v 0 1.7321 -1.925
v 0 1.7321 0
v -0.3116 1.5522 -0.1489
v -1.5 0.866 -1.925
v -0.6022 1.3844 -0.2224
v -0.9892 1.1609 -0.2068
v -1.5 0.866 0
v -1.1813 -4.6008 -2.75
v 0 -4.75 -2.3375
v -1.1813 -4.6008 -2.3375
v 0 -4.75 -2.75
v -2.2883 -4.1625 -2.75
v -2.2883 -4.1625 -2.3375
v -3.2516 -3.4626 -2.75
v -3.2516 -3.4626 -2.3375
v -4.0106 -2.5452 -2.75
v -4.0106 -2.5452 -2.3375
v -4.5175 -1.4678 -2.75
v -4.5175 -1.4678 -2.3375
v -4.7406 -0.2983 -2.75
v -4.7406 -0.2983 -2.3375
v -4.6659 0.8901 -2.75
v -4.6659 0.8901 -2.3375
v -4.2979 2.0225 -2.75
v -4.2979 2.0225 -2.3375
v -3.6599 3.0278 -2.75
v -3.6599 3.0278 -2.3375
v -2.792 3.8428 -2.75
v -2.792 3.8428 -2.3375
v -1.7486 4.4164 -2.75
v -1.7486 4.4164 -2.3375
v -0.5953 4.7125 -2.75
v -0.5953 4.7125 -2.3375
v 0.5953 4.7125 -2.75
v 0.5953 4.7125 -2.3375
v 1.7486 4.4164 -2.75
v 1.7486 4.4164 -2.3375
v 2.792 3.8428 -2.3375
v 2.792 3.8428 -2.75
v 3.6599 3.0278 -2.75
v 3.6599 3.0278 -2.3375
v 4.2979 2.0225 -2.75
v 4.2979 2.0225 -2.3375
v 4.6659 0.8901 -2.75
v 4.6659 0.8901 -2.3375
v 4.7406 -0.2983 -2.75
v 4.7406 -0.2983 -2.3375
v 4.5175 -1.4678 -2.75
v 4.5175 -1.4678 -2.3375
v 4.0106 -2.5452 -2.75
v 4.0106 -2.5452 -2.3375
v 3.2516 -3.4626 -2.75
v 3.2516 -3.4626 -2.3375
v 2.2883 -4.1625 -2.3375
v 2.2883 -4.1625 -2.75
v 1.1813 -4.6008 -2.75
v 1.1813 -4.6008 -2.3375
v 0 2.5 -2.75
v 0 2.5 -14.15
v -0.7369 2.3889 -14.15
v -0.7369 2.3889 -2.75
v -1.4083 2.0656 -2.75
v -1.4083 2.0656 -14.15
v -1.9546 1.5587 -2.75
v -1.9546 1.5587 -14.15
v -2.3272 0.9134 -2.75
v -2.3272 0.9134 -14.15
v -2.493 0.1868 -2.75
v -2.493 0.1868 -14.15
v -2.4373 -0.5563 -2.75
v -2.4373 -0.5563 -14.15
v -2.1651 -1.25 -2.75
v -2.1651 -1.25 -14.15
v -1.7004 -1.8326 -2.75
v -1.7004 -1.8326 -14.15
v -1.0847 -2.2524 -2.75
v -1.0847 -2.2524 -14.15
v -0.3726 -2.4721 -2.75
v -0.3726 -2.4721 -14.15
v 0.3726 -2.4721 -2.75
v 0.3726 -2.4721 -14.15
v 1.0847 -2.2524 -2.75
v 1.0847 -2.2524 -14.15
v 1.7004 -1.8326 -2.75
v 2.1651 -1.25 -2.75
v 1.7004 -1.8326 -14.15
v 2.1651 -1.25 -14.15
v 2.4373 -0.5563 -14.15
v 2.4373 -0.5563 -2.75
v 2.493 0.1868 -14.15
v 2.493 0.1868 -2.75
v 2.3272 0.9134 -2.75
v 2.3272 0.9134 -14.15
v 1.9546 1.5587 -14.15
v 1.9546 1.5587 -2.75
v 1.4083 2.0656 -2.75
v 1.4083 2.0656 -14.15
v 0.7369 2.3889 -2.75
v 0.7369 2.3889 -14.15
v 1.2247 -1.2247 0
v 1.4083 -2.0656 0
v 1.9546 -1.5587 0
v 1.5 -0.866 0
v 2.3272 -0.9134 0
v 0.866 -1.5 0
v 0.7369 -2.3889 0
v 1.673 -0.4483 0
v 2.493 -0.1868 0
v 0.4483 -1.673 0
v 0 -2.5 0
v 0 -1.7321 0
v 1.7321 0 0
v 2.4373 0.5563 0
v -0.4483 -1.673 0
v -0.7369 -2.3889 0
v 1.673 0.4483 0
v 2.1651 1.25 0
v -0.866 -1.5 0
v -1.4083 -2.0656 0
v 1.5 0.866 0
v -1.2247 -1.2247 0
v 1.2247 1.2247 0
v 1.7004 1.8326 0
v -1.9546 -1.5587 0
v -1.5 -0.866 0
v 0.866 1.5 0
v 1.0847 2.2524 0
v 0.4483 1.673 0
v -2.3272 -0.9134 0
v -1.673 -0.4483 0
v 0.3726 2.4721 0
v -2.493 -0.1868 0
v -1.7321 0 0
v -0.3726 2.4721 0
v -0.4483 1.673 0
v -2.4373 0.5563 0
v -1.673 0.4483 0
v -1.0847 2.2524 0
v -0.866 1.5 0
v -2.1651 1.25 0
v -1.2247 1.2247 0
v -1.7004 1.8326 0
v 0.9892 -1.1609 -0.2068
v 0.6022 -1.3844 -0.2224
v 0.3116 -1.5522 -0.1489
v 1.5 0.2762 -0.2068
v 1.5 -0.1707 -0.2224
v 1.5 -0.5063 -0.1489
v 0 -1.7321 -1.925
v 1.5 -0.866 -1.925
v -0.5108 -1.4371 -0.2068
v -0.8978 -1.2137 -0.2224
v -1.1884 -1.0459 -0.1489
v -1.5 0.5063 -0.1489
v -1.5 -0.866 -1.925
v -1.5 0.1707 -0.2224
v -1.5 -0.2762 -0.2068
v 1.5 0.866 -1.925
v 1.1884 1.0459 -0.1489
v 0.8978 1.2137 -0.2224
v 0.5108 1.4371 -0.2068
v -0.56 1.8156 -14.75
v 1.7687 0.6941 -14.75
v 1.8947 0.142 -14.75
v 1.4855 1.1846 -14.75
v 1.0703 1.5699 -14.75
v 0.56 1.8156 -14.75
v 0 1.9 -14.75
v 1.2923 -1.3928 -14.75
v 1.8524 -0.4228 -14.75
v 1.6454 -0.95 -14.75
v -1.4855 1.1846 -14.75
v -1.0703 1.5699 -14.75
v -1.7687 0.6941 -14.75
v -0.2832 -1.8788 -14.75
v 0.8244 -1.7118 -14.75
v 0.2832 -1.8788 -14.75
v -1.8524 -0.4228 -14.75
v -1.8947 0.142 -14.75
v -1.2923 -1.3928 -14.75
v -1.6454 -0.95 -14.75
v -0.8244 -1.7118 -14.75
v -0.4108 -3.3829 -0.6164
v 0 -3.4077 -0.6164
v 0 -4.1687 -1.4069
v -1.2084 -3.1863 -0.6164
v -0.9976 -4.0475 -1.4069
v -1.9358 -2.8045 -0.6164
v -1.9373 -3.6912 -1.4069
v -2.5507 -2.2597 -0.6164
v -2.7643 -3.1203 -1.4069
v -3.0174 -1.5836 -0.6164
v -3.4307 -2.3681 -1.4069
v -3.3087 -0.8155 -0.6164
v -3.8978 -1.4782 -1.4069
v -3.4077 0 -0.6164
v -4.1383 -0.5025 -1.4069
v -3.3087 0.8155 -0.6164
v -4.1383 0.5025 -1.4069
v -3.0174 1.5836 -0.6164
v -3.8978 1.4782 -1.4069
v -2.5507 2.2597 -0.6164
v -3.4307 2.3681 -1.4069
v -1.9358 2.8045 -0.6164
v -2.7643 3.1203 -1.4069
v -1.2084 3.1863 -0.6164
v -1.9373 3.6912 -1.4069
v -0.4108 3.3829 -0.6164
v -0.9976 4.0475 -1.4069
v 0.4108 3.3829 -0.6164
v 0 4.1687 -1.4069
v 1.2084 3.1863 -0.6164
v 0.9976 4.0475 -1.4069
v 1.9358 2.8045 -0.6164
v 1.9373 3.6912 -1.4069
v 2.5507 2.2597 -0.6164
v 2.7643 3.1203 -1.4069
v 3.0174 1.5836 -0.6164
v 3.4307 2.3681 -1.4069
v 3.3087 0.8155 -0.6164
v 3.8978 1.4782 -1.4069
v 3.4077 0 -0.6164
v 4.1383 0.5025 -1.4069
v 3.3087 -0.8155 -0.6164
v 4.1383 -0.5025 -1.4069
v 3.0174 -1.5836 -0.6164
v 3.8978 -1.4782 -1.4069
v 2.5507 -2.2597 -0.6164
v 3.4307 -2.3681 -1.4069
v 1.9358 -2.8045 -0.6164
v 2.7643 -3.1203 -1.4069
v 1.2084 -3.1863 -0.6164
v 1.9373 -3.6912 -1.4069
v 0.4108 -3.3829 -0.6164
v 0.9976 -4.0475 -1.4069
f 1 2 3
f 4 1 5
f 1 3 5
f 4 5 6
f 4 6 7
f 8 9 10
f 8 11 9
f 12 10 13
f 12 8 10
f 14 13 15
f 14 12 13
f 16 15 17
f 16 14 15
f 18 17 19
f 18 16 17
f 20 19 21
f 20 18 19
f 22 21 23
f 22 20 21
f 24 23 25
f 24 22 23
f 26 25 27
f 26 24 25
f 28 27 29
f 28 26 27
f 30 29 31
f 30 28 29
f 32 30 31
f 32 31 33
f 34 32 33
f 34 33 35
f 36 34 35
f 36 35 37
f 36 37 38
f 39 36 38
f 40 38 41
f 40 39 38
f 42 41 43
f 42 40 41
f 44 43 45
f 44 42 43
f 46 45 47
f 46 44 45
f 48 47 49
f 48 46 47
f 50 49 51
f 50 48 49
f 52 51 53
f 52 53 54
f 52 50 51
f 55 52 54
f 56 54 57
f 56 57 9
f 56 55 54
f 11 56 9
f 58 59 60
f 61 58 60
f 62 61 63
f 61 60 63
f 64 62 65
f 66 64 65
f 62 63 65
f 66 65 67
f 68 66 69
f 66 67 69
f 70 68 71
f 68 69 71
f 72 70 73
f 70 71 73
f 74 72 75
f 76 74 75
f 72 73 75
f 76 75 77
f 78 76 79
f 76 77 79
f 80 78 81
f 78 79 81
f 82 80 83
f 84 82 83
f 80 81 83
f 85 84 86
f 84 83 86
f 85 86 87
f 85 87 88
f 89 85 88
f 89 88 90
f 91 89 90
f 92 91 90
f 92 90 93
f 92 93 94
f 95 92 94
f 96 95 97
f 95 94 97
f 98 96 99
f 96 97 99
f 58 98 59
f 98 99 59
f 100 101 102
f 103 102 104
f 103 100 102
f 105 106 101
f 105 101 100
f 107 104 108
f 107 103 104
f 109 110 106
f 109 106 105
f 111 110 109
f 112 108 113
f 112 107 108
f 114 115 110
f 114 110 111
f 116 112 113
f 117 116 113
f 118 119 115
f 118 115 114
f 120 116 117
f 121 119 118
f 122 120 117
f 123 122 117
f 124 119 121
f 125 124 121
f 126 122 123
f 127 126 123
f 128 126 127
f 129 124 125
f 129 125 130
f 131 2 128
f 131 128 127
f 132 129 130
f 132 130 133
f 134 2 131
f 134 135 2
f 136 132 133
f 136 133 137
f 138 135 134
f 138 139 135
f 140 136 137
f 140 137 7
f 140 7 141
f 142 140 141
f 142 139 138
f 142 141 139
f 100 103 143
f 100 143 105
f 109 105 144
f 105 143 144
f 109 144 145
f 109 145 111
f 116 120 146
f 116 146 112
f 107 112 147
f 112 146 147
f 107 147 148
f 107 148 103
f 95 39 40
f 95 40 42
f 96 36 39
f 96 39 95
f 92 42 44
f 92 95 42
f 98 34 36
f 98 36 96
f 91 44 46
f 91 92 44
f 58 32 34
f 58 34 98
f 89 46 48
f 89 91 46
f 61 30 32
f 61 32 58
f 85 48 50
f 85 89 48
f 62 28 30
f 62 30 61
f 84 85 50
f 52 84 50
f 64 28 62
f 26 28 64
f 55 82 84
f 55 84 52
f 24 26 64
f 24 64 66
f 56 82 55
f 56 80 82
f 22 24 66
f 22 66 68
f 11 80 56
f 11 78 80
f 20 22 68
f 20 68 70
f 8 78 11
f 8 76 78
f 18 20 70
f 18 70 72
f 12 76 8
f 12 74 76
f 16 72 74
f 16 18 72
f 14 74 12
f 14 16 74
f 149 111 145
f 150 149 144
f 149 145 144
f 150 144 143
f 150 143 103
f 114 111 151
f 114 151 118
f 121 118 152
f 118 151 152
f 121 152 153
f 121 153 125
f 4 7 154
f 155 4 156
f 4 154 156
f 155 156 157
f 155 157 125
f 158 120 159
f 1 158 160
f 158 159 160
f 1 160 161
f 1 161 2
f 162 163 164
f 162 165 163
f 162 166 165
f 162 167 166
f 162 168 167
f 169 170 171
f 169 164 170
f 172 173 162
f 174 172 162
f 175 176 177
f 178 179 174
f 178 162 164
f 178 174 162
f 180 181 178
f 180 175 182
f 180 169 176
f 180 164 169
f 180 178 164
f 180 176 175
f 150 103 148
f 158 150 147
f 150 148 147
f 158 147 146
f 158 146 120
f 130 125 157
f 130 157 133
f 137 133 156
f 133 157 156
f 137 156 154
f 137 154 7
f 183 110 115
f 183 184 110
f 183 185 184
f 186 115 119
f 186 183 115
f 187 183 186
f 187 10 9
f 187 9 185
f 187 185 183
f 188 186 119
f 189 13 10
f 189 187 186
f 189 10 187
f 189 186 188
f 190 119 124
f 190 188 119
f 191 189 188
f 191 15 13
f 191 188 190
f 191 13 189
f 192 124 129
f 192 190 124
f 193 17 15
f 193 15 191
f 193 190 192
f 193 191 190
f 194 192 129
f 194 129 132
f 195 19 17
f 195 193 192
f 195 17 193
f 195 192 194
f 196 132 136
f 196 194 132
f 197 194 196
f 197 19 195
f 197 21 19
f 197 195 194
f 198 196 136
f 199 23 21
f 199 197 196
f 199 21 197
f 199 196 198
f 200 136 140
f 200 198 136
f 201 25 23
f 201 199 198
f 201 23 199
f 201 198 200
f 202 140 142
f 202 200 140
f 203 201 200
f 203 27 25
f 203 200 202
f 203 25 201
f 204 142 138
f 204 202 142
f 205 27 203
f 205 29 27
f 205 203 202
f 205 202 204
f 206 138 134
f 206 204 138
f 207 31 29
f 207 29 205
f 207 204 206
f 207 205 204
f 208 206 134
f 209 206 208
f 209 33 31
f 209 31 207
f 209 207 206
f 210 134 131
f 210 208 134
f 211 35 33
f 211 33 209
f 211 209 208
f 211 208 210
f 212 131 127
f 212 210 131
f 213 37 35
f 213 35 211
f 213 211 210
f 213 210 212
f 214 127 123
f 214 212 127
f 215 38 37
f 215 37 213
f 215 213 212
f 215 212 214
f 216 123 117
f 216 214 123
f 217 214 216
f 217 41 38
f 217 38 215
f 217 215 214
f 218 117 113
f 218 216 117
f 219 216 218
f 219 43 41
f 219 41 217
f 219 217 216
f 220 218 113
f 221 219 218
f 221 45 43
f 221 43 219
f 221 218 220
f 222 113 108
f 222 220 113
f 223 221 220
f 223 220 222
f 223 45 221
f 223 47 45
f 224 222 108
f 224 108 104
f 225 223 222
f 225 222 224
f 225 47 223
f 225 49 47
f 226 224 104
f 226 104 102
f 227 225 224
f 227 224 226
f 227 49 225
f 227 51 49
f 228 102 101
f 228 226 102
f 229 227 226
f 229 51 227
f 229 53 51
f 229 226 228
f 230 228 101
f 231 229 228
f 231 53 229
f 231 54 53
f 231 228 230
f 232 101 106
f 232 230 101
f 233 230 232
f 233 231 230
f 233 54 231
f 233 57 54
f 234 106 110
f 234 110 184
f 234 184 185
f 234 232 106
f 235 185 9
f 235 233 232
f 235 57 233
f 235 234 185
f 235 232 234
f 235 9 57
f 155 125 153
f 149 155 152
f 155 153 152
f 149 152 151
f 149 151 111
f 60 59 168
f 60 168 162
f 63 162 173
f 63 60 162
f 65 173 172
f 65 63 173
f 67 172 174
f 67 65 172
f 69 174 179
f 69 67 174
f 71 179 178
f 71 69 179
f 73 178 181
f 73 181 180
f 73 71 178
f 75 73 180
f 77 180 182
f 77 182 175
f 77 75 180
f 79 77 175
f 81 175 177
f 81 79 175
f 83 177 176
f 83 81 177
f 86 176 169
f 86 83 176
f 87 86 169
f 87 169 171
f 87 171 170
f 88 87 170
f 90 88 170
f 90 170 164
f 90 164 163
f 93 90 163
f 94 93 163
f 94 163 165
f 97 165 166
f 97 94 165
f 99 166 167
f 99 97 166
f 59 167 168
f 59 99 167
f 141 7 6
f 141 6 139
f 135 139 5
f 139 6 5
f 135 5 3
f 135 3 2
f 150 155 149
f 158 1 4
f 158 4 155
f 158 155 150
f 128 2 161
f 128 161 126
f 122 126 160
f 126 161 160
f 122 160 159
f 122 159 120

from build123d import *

# Parameters (mm, degrees)
SKETCH1_W          = 12
SKETCH1_H          = 2.5
CHAMFER1_SIZE      = 0.6
CUT_EXTRUDE2_DEPTH = 1.925


with BuildPart() as part:
    # Sketch1 → Revolve1 (revolve)
    with BuildSketch(Plane(origin=(0, 0, 0), x_dir=(0, 0, -1), z_dir=(1, 0, 0))):
        with Locations((8.75, 1.25)):
            Rectangle(SKETCH1_W, SKETCH1_H)
    revolve(axis=Axis((0, 0, -14.75), (0, 0, 1)))

    # Chamfer1
    chamfer1_edges = [part.edges().sort_by_distance(p)[0] for p in [
        (0, -2.5, -14.75),
    ]]
    chamfer(chamfer1_edges, length=CHAMFER1_SIZE)

    # Sketch7 → Revolve2 (revolve)
    with BuildSketch(Plane(origin=(0, 0, 0), x_dir=(0, 0, -1), z_dir=(1, 0, 0))):
        with BuildLine():
            Line((2.3375, 4.75), (2.75, 4.75))
            Line((2.75, 4.75), (2.75, 0))
            Line((2.75, 0), (0, 0))
            Line((0, 0), (0, 2.5))
            ThreePointArc((0, 2.5), (0.991875183, 3.808753282), (2.3375, 4.75))
        make_face()
    revolve(axis=Axis((0, 0, 0), (0, 0, -1)))

    # Sketch5 → Cut-Extrude2 (cut)
    with BuildSketch(Plane.XY):
        Polygon((1.5, -0.866025404), (1.5, 0.866025404), (0, 1.732050808), (-1.5, 0.866025404), (-1.5, -0.866025404), (0, -1.732050808), align=None)
    extrude(amount=-CUT_EXTRUDE2_DEPTH, mode=Mode.SUBTRACT)

    # Cut-Extrude3 cone 1 section (through the dimple's axis) → Cut-Extrude3 (revolve, cut)
    with BuildSketch(Plane(origin=(0, 0, 0), x_dir=(0, -1, 0), z_dir=(1, 0, 0))):
        Polygon((0, 0), (1.732050808, 0), (0, 1.732050808), align=None)
    revolve(axis=Axis((0, 0, 0), (0, 0, -1)), mode=Mode.SUBTRACT)


solid = part.part
